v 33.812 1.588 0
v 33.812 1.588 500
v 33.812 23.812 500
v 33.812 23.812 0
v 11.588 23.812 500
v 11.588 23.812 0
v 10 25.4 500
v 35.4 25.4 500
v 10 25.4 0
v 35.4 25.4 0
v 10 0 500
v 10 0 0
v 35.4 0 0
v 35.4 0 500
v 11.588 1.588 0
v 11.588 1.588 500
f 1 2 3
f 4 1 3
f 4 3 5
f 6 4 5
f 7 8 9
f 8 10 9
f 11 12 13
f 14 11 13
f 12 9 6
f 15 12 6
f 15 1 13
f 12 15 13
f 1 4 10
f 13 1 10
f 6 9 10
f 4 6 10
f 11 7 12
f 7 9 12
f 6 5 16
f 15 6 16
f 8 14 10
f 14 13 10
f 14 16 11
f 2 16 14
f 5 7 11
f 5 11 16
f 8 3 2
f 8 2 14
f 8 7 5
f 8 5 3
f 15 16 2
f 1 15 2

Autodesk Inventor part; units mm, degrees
ref_plane "YZ Plane" through (0, 0, 0) normal (1, 0, 0) x (0, 1, 0)
ref_plane "XZ Plane" through (0, 0, 0) normal (0, 1, 0) x (-1, 0, 0)
ref_plane "XY Plane" through (0, 0, 0) normal (0, 0, 1) x (1, 0, 0)
sketch "Sketch1" plane through (0, 0, 0) normal (0, 0, 1) x (1, 0, 0)
  line L0 (93.1, 0) -> (67.7, 0) projected
  line L1 (93.1, 0) -> (67.7, 0) projected
  line L2 (10, 0) -> (35.4, 0)
  line L3 (35.4, 0) -> (35.4, 25.4)
  line L4 (35.4, 25.4) -> (10, 25.4)
  line L5 (10, 25.4) -> (10, 0)
  line L6 (11.5875, 1.5875) -> (33.8125, 1.5875)
  line L7 (33.8125, 1.5875) -> (33.8125, 23.8125)
  line L8 (33.8125, 23.8125) -> (11.5875, 23.8125)
  line L9 (11.5875, 23.8125) -> (11.5875, 1.5875)
  line L10 (67.7, 25.4) -> (67.7, 0) projected
  line L11 (93.1, 0) -> (93.1, 25.4) projected
  line L12 (93.1, 25.4) -> (67.7, 25.4) projected
  line L13 (67.7, 25.4) -> (67.7, 0) projected
  line L14 (93.1, 0) -> (93.1, 25.4) projected
  line L15 (93.1, 25.4) -> (67.7, 25.4) projected
  point P0 (0, 0)
  dimension "d0" = 22.225
  dimension "d1" = 22.225
  dimension "d3" = 1.5875
extrude "Extrusion1" add sketch "Sketch1" along normal blind 500 contours L5 L4 L3 L2
properties part number "LateralBars"
